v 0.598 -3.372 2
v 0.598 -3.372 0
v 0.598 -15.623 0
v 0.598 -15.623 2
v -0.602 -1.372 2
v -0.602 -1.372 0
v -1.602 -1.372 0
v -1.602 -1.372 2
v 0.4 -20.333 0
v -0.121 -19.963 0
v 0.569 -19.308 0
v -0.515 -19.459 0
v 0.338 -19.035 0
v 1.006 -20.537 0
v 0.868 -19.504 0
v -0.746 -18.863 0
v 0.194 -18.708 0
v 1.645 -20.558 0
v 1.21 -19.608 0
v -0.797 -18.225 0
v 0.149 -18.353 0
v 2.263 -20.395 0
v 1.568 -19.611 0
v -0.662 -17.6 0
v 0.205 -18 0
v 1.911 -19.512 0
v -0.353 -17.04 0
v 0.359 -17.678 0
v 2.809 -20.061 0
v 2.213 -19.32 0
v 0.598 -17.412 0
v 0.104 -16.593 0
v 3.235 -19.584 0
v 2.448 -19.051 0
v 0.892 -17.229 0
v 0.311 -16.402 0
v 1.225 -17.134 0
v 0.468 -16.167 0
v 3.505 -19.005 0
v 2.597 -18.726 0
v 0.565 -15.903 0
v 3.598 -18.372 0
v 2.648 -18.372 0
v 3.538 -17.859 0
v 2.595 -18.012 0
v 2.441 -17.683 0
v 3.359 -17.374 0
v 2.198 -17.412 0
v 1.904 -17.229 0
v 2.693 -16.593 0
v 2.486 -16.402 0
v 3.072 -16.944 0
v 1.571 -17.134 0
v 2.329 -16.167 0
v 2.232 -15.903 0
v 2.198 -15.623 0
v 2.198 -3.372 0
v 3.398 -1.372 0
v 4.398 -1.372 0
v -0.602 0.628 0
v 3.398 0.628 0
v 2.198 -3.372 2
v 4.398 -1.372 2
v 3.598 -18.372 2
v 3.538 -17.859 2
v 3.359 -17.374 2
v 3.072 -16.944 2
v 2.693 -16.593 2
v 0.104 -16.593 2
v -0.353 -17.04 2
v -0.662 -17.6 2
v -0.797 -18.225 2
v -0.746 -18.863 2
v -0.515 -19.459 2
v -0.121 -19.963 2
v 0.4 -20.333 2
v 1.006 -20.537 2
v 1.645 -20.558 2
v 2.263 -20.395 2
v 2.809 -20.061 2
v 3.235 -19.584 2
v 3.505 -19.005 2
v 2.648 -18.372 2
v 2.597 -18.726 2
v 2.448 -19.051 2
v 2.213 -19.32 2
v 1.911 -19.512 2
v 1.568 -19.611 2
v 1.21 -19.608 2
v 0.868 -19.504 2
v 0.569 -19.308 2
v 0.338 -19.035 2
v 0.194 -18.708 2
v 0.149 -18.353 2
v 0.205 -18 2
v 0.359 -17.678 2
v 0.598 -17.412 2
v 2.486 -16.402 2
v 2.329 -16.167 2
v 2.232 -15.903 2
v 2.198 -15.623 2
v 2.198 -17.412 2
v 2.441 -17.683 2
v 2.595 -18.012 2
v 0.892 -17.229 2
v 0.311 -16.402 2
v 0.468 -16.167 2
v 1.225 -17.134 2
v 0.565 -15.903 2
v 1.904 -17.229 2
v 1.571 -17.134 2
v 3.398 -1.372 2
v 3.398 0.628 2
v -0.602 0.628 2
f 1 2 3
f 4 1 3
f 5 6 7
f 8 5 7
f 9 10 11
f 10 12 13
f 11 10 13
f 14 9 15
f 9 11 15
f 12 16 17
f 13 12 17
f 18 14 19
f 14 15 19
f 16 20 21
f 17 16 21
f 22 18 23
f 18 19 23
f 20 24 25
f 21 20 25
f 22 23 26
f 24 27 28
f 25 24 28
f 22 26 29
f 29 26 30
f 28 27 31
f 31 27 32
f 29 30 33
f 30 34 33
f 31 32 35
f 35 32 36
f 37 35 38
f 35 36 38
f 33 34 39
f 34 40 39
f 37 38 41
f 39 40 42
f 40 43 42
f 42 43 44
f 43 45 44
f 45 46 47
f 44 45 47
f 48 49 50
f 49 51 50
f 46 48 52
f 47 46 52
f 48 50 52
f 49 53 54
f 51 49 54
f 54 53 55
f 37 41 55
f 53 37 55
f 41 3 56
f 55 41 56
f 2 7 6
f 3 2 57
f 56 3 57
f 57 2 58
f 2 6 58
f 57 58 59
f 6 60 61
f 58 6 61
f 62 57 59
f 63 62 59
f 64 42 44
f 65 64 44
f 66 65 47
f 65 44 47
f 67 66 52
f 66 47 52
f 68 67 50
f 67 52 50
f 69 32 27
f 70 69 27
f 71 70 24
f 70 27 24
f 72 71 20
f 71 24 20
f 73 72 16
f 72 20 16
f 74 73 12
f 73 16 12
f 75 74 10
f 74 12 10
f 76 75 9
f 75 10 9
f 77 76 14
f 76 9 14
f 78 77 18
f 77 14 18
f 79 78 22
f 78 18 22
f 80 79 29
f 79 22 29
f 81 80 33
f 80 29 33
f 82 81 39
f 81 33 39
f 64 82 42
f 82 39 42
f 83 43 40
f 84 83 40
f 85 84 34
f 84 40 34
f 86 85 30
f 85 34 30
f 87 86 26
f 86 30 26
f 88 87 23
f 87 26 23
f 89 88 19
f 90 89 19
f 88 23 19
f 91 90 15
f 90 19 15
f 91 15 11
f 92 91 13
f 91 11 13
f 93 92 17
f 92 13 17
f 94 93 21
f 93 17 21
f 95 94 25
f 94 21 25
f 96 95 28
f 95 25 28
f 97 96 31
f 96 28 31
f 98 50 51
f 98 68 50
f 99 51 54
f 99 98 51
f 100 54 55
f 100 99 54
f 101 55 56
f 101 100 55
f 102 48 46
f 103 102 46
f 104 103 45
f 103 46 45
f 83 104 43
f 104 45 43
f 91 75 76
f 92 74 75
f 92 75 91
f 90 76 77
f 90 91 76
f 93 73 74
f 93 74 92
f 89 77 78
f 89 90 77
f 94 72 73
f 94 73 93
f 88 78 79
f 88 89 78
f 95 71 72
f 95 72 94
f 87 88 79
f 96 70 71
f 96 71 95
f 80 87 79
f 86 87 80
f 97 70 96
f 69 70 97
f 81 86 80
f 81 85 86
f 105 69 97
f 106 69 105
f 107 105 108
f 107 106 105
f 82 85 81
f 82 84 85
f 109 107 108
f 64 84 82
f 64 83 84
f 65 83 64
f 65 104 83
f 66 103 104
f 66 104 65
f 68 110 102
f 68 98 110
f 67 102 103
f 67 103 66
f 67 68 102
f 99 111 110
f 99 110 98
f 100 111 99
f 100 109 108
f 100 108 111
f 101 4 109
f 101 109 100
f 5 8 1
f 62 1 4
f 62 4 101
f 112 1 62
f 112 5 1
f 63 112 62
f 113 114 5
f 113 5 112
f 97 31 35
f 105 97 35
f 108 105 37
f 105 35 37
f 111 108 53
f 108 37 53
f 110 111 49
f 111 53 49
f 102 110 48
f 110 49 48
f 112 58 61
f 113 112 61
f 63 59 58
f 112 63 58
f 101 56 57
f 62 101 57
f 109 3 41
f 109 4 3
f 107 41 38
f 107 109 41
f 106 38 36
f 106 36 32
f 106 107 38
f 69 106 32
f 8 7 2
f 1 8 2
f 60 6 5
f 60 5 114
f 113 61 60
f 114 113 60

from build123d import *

# Parameters (mm, degrees)
ESQUISSE1_W        = 2
ESQUISSE1_H        = 2
BOSS_EXTRU_1_DEPTH = 2
CONG_1_R           = 1.2


with BuildPart() as part:
    # Esquisse1 → Boss.-Extru.1 (new body)
    with BuildSketch(Plane.XY):
        with BuildLine():
            Line((2.198395722, -3.372264328), (0.598395722, -3.372264328))
            Line((0.598395722, -3.372264328), (0.598395722, -16.322874175))
            ThreePointArc((0.598395722, -16.322874175), (1.398395722, -16.172264328), (2.198395722, -16.322874175))
            Line((2.198395722, -16.322874175), (2.198395722, -3.372264328))
        make_face()
        Polygon((-0.601604278, -1.372264328), (-1.601604278, -1.372264328), (0.598395722, -3.372264328), (2.198395722, -3.372264328), (4.398395722, -1.372264328), (3.398395722, -1.372264328), (1.398395722, -1.372264328), align=None)
        with Locations((2.398395722, -0.372264328)):
            Rectangle(ESQUISSE1_W, ESQUISSE1_H)
        with Locations((0.398395722, -0.372264328)):
            Rectangle(ESQUISSE1_W, ESQUISSE1_H)
        with BuildLine():
            ThreePointArc((2.198395722, -16.322874175), (1.398395722, -16.172264328), (0.598395722, -16.322874175))
            Line((0.598395722, -16.322874175), (0.598395722, -17.411795692))
            ThreePointArc((0.598395722, -17.411795692), (1.398395722, -17.122264328), (2.198395722, -17.411795692))
            Line((2.198395722, -17.411795692), (2.198395722, -16.322874175))
        make_face()
        with BuildLine():
            Line((0.598395722, -17.411795692), (0.598395722, -16.322874175))
            ThreePointArc((0.598395722, -16.322874175), (0.157428357, -20.188854541), (3.598395722, -18.372264328))
            ThreePointArc((3.598395722, -18.372264328), (3.214985934, -17.131296963), (2.198395722, -16.322874175))
            Line((2.198395722, -16.322874175), (2.198395722, -17.411795692))
            ThreePointArc((2.198395722, -17.411795692), (2.530318864, -17.841934242), (2.648395722, -18.372264328))
            ThreePointArc((2.648395722, -18.372264328), (0.868065636, -19.50418747), (0.598395722, -17.411795692))
        make_face()
    extrude(amount=BOSS_EXTRU_1_DEPTH)

    # Congé1
    cong_1_edges = [part.edges().sort_by_distance(p)[0] for p in [
        (2.198395722, -16.322874175, 1),
        (0.598395722, -16.322874175, 1),
    ]]
    fillet(cong_1_edges, radius=CONG_1_R)


solid = part.part
